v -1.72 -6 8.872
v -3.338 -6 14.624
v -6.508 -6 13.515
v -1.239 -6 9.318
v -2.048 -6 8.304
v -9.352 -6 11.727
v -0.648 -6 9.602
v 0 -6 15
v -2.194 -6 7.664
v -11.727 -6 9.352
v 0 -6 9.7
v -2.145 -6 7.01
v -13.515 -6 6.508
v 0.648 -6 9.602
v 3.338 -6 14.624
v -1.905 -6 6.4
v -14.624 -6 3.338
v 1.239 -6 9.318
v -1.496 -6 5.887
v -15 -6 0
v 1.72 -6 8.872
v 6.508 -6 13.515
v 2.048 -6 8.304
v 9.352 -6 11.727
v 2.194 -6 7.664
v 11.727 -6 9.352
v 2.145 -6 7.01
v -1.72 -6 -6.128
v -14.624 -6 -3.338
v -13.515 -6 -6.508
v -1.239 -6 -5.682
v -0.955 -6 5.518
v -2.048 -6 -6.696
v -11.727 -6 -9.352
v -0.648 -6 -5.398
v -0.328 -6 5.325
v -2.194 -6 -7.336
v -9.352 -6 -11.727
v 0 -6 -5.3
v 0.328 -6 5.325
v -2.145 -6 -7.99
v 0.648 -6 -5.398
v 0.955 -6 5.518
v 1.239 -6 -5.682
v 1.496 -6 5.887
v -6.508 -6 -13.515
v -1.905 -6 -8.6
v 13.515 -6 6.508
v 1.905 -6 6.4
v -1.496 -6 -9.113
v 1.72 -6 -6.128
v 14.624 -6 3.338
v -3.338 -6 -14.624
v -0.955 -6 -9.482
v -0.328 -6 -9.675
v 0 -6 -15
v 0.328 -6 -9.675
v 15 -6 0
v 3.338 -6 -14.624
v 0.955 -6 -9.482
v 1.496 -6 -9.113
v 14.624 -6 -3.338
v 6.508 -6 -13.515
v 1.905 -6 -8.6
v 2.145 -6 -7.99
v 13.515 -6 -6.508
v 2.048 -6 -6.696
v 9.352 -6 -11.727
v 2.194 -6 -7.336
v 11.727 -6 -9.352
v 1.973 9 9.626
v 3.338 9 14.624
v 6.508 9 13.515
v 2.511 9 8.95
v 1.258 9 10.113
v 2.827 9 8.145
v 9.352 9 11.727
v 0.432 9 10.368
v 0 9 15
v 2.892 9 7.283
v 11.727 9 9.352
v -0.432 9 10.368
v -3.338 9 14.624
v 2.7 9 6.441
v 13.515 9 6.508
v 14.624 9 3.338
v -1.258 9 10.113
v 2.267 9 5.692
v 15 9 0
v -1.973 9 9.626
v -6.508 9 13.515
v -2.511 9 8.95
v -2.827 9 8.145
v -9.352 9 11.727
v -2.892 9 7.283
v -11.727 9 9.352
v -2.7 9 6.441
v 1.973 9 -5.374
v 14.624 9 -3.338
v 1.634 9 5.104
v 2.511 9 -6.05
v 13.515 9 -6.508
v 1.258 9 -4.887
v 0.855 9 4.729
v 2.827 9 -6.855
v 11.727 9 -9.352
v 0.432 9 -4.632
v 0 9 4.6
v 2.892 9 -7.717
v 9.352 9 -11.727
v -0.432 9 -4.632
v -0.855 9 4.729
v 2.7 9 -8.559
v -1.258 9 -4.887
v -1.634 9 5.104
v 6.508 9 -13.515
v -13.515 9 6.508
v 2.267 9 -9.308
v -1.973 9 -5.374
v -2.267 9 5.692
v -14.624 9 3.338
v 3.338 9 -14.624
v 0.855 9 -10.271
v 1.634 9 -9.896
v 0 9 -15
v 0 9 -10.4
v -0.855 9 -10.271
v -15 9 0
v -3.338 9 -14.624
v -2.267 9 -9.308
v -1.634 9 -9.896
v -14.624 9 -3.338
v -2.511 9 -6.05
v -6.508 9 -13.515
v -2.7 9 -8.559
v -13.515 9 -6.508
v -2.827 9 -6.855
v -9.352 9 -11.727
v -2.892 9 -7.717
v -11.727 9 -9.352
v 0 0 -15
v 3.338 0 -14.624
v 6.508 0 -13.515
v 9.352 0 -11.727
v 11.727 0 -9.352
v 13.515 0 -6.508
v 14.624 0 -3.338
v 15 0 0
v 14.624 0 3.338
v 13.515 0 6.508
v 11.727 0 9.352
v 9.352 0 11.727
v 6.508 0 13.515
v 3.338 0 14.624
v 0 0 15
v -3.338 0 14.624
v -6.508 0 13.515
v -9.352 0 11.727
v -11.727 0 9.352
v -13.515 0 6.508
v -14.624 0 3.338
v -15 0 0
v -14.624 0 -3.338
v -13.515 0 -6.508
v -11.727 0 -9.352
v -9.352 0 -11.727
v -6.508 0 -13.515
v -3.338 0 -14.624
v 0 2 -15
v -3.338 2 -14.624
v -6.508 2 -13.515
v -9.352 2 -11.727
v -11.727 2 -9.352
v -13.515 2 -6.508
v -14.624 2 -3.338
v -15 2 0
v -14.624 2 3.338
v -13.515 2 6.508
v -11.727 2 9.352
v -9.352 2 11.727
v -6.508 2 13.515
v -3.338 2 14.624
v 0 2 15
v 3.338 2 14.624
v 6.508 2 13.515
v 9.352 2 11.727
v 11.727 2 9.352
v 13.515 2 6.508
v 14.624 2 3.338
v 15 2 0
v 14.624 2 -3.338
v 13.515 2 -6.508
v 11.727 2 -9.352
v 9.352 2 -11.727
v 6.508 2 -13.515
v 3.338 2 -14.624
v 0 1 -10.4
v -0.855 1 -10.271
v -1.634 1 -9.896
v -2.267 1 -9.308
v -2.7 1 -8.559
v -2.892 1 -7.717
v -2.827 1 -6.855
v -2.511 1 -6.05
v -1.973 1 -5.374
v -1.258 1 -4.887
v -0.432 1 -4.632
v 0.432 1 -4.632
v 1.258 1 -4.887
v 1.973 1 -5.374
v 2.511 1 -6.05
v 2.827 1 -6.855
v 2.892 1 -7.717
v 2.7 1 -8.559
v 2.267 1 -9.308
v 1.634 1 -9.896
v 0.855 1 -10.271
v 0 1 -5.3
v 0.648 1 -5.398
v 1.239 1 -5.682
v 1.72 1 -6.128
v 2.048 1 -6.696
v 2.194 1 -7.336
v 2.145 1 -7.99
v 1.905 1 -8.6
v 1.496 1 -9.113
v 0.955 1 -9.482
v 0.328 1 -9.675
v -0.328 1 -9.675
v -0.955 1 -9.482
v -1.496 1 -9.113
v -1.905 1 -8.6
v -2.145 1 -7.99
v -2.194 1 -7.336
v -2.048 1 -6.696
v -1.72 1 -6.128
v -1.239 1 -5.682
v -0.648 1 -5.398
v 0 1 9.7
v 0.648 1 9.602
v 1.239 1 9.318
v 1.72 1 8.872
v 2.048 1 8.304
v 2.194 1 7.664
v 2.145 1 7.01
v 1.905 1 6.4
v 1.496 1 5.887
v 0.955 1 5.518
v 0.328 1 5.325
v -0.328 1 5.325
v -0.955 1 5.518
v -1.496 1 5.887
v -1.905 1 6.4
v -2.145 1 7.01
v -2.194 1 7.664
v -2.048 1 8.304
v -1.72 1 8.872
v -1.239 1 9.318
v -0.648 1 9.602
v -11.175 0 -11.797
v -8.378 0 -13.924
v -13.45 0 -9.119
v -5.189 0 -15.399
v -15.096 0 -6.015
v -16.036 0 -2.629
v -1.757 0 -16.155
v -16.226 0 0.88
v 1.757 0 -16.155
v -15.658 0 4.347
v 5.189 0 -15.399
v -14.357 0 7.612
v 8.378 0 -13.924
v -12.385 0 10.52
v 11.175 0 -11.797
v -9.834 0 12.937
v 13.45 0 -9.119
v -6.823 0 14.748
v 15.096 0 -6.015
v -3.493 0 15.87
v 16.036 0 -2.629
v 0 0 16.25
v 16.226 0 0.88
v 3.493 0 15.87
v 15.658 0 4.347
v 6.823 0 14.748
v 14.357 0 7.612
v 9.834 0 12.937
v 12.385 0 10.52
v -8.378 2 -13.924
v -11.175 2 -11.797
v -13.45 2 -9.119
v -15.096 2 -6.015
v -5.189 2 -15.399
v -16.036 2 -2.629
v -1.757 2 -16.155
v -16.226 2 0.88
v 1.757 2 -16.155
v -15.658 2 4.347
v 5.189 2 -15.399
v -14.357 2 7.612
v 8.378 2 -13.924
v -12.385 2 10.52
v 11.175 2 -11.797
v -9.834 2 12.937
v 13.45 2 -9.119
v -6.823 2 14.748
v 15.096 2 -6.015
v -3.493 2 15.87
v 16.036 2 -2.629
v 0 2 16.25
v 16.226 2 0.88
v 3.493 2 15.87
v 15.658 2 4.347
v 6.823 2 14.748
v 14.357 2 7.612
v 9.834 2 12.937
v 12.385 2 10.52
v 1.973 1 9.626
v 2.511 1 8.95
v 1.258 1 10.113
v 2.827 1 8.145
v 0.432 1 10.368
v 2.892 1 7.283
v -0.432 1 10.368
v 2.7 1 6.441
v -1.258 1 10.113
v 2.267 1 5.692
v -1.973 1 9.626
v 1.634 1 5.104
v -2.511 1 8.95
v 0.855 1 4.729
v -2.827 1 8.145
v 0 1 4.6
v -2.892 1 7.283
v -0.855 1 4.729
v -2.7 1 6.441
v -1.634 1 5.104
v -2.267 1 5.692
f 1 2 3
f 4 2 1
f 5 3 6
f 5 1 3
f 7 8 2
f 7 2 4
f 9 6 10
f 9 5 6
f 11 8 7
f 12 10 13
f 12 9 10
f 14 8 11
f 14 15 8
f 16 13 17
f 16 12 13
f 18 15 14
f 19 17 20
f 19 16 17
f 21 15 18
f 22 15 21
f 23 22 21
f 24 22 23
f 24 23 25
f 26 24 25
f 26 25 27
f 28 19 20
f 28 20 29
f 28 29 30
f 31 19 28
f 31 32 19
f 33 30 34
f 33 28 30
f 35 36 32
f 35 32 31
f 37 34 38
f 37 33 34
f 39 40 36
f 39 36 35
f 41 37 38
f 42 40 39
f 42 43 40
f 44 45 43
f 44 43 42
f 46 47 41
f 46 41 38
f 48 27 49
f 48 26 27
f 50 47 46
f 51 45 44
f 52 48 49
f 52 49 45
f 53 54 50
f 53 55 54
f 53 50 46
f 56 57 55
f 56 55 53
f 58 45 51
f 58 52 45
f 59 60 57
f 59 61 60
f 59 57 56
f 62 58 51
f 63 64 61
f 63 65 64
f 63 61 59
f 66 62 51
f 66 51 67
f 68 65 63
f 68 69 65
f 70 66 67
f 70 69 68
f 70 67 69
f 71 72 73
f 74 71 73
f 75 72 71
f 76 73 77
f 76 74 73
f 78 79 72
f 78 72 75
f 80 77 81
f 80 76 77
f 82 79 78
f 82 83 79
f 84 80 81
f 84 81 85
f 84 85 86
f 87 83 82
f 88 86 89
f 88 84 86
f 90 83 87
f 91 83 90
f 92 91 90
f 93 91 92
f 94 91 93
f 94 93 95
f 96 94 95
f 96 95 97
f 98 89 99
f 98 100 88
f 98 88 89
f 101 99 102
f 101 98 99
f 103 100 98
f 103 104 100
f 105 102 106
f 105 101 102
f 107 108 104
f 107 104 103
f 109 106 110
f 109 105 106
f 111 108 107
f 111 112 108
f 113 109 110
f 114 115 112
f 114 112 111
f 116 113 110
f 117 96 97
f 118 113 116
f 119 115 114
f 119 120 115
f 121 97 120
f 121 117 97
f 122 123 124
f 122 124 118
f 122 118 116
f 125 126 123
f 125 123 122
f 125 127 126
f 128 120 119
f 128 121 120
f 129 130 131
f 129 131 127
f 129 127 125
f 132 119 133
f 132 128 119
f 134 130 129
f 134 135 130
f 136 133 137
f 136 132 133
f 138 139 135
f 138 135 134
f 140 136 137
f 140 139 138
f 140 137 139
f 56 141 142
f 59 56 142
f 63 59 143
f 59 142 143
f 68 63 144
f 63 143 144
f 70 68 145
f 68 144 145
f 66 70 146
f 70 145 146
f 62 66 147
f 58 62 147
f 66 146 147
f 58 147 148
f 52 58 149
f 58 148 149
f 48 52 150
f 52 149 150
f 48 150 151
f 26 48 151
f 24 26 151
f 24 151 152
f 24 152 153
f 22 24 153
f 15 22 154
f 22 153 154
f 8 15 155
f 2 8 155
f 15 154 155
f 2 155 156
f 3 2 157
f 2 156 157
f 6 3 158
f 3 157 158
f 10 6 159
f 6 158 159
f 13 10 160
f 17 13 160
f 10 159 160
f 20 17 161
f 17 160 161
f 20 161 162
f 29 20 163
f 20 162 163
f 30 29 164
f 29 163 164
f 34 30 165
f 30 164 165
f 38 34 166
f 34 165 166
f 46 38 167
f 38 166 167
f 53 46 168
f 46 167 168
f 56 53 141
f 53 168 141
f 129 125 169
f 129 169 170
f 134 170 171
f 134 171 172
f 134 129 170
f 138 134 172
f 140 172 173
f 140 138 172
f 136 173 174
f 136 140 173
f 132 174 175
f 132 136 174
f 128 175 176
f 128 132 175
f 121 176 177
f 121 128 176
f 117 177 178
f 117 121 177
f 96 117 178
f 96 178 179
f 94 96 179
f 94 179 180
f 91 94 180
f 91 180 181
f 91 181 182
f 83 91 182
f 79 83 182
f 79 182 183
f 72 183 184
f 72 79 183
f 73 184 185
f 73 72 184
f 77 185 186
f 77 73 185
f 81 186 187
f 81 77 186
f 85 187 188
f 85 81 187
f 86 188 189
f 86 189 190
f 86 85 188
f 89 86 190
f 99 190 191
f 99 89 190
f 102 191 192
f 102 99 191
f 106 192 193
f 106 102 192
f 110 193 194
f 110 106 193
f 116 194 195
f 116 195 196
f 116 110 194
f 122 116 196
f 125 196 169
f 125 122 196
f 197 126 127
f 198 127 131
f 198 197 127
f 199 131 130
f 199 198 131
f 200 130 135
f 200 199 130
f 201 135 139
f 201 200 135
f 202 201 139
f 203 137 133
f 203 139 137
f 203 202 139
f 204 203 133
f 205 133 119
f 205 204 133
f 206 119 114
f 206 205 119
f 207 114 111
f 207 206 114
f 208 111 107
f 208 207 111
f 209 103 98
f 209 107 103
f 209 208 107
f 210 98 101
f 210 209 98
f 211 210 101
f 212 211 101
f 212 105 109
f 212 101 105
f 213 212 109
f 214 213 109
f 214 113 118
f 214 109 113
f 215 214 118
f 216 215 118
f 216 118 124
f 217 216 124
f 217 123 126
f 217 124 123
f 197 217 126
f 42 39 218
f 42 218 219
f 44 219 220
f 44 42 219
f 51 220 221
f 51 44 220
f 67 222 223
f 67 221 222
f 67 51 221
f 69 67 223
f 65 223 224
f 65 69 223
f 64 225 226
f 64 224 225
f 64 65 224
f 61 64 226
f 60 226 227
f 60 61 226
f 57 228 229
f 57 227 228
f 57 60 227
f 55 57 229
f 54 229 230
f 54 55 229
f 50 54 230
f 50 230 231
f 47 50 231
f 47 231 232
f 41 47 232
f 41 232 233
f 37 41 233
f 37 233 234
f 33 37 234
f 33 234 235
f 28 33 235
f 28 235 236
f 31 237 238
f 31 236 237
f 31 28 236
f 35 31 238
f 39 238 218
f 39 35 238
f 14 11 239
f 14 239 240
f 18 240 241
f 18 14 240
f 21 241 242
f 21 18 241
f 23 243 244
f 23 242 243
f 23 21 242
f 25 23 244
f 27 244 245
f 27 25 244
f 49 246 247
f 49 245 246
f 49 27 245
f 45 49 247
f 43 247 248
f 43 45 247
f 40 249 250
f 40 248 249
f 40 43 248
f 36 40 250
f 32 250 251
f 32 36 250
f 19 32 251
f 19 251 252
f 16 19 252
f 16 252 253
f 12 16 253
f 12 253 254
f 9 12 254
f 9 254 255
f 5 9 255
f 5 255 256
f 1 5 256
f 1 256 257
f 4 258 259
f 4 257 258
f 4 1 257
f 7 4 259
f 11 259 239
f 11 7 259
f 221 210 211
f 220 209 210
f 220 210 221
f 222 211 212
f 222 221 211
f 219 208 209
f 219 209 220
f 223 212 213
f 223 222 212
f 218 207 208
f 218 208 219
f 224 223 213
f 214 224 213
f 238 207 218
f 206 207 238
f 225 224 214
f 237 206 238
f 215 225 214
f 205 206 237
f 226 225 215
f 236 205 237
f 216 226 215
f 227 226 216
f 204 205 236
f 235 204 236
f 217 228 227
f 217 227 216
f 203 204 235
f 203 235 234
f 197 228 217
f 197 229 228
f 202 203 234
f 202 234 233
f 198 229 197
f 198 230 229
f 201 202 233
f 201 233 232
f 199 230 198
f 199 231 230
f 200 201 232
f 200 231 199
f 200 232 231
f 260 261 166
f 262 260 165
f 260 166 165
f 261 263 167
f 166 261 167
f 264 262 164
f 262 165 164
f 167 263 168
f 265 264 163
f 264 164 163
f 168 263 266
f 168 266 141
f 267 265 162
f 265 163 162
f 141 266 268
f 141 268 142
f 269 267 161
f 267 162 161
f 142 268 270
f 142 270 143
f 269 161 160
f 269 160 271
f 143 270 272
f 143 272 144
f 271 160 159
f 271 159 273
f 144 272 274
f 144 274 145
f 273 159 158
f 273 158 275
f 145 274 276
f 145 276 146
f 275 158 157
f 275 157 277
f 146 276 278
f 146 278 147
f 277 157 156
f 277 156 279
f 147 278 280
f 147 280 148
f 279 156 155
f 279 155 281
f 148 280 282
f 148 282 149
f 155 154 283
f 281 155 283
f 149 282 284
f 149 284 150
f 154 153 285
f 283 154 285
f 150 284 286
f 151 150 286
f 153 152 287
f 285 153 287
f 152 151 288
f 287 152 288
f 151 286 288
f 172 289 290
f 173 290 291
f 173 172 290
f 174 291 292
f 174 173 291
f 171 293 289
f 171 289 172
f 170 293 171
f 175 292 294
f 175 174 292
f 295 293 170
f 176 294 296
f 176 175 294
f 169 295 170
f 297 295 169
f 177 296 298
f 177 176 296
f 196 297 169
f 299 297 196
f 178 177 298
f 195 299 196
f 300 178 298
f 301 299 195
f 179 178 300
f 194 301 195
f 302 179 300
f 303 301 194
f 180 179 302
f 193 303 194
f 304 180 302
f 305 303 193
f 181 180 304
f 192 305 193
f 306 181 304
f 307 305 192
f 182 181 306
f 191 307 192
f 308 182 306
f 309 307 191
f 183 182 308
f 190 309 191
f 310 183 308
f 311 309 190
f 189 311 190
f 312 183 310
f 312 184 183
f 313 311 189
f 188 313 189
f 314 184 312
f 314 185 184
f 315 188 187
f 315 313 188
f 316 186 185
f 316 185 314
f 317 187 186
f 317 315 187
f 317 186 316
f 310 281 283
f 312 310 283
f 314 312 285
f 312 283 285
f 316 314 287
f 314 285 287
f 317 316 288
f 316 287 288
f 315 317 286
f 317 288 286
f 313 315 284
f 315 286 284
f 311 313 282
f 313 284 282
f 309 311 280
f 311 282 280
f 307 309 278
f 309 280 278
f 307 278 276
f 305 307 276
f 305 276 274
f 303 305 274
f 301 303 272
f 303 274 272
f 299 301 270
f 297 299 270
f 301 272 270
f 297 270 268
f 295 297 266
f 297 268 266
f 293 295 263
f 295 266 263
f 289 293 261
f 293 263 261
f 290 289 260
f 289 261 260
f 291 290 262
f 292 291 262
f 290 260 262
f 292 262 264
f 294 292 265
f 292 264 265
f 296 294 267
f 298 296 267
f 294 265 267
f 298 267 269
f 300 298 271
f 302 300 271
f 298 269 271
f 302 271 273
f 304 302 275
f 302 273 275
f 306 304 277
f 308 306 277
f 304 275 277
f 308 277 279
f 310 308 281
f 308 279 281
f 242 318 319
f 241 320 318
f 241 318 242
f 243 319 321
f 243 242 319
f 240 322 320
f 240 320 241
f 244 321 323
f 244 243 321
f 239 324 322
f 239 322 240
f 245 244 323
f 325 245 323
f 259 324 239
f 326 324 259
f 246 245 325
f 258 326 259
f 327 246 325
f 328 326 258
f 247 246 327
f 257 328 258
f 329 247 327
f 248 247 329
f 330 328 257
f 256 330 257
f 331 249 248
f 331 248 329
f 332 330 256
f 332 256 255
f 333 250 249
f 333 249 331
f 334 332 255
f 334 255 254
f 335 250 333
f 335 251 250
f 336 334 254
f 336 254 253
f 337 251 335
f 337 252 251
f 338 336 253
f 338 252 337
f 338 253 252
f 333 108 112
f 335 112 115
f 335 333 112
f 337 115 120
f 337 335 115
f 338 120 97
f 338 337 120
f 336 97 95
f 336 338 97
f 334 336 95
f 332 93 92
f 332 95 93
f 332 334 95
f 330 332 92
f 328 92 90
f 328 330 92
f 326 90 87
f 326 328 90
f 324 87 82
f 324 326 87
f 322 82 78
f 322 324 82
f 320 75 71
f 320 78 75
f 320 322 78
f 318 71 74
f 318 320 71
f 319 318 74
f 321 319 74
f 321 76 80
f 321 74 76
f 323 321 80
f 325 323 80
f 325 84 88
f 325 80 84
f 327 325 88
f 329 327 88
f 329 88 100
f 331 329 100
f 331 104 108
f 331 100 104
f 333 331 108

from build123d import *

# Parameters (mm, degrees)
SKETCH1_R               = 16.25
BOSS_EXTRUDE1_DEPTH     = 2
SKETCH2_R               = 15
BOSS_EXTRUDE2_DEPTH     = 6
BOSS_EXTRUDE3_START     = 7
SKETCH3_R               = 15
BOSS_EXTRUDE3_DEPTH     = 7
CUT_EXTRUDE1_DEPTH      = 28.443123
CUT_EXTRUDE1_DEPTH_BACK = 8
SKETCH4_R               = 2.9
CUT_EXTRUDE2_DEPTH      = 25.33361872
CUT_EXTRUDE2_DEPTH_BACK = 25.33361872
SKETCH5_R               = 2.2


with BuildPart() as part:
    # Sketch1 → Boss-Extrude1 (new body)
    with BuildSketch(Plane(origin=(0, 0, 0), x_dir=(1, 0, 0), z_dir=(0, 1, 0))):
        with Locations(Location((0, 0, 0), (0, 0, 270))):
            Circle(SKETCH1_R)
    extrude(amount=BOSS_EXTRUDE1_DEPTH)

    # Sketch2 → Boss-Extrude2 (add)
    with BuildSketch(Plane.XZ):
        with Locations(Location((0, 0, 0), (0, 0, 270))):
            Circle(SKETCH2_R)
    extrude(amount=BOSS_EXTRUDE2_DEPTH)

    # Sketch3 → Boss-Extrude3 (add)
    with BuildSketch(Plane(origin=(0, 2, 0), x_dir=(1, 0, 0), z_dir=(0, 1, 0)).offset(BOSS_EXTRUDE3_START)):
        with Locations(Location((0, 0, 0), (0, 0, 90))):
            Circle(SKETCH3_R)
    extrude(amount=-BOSS_EXTRUDE3_DEPTH)

    # Sketch4 → Cut-Extrude1 (cut, two sides: drawn at the far end of the back side and taken through both)
    with BuildSketch(Plane(origin=(0, 9, 0), x_dir=(1, 0, 0), z_dir=(0, 1, 0)).offset(-CUT_EXTRUDE1_DEPTH_BACK)):
        with Locations(Location((0, 7.5, 0), (0, 0, 90))):
            Circle(SKETCH4_R)
        with Locations(Location((0, -7.5, 0), (0, 0, 90))):
            Circle(SKETCH4_R)
    extrude(amount=CUT_EXTRUDE1_DEPTH + CUT_EXTRUDE1_DEPTH_BACK, mode=Mode.SUBTRACT)

    # Sketch5 → Cut-Extrude2 (cut, two sides: drawn at the far end of the back side and taken through both)
    with BuildSketch(Plane(origin=(0, 1, 0), x_dir=(1, 0, 0), z_dir=(0, 1, 0)).offset(-CUT_EXTRUDE2_DEPTH_BACK)):
        with Locations(Location((0, 7.5, 0), (0, 0, 270))):
            Circle(SKETCH5_R)
        with Locations(Location((0, -7.5, 0), (0, 0, 270))):
            Circle(SKETCH5_R)
    extrude(amount=CUT_EXTRUDE2_DEPTH + CUT_EXTRUDE2_DEPTH_BACK, mode=Mode.SUBTRACT)


solid = part.part
